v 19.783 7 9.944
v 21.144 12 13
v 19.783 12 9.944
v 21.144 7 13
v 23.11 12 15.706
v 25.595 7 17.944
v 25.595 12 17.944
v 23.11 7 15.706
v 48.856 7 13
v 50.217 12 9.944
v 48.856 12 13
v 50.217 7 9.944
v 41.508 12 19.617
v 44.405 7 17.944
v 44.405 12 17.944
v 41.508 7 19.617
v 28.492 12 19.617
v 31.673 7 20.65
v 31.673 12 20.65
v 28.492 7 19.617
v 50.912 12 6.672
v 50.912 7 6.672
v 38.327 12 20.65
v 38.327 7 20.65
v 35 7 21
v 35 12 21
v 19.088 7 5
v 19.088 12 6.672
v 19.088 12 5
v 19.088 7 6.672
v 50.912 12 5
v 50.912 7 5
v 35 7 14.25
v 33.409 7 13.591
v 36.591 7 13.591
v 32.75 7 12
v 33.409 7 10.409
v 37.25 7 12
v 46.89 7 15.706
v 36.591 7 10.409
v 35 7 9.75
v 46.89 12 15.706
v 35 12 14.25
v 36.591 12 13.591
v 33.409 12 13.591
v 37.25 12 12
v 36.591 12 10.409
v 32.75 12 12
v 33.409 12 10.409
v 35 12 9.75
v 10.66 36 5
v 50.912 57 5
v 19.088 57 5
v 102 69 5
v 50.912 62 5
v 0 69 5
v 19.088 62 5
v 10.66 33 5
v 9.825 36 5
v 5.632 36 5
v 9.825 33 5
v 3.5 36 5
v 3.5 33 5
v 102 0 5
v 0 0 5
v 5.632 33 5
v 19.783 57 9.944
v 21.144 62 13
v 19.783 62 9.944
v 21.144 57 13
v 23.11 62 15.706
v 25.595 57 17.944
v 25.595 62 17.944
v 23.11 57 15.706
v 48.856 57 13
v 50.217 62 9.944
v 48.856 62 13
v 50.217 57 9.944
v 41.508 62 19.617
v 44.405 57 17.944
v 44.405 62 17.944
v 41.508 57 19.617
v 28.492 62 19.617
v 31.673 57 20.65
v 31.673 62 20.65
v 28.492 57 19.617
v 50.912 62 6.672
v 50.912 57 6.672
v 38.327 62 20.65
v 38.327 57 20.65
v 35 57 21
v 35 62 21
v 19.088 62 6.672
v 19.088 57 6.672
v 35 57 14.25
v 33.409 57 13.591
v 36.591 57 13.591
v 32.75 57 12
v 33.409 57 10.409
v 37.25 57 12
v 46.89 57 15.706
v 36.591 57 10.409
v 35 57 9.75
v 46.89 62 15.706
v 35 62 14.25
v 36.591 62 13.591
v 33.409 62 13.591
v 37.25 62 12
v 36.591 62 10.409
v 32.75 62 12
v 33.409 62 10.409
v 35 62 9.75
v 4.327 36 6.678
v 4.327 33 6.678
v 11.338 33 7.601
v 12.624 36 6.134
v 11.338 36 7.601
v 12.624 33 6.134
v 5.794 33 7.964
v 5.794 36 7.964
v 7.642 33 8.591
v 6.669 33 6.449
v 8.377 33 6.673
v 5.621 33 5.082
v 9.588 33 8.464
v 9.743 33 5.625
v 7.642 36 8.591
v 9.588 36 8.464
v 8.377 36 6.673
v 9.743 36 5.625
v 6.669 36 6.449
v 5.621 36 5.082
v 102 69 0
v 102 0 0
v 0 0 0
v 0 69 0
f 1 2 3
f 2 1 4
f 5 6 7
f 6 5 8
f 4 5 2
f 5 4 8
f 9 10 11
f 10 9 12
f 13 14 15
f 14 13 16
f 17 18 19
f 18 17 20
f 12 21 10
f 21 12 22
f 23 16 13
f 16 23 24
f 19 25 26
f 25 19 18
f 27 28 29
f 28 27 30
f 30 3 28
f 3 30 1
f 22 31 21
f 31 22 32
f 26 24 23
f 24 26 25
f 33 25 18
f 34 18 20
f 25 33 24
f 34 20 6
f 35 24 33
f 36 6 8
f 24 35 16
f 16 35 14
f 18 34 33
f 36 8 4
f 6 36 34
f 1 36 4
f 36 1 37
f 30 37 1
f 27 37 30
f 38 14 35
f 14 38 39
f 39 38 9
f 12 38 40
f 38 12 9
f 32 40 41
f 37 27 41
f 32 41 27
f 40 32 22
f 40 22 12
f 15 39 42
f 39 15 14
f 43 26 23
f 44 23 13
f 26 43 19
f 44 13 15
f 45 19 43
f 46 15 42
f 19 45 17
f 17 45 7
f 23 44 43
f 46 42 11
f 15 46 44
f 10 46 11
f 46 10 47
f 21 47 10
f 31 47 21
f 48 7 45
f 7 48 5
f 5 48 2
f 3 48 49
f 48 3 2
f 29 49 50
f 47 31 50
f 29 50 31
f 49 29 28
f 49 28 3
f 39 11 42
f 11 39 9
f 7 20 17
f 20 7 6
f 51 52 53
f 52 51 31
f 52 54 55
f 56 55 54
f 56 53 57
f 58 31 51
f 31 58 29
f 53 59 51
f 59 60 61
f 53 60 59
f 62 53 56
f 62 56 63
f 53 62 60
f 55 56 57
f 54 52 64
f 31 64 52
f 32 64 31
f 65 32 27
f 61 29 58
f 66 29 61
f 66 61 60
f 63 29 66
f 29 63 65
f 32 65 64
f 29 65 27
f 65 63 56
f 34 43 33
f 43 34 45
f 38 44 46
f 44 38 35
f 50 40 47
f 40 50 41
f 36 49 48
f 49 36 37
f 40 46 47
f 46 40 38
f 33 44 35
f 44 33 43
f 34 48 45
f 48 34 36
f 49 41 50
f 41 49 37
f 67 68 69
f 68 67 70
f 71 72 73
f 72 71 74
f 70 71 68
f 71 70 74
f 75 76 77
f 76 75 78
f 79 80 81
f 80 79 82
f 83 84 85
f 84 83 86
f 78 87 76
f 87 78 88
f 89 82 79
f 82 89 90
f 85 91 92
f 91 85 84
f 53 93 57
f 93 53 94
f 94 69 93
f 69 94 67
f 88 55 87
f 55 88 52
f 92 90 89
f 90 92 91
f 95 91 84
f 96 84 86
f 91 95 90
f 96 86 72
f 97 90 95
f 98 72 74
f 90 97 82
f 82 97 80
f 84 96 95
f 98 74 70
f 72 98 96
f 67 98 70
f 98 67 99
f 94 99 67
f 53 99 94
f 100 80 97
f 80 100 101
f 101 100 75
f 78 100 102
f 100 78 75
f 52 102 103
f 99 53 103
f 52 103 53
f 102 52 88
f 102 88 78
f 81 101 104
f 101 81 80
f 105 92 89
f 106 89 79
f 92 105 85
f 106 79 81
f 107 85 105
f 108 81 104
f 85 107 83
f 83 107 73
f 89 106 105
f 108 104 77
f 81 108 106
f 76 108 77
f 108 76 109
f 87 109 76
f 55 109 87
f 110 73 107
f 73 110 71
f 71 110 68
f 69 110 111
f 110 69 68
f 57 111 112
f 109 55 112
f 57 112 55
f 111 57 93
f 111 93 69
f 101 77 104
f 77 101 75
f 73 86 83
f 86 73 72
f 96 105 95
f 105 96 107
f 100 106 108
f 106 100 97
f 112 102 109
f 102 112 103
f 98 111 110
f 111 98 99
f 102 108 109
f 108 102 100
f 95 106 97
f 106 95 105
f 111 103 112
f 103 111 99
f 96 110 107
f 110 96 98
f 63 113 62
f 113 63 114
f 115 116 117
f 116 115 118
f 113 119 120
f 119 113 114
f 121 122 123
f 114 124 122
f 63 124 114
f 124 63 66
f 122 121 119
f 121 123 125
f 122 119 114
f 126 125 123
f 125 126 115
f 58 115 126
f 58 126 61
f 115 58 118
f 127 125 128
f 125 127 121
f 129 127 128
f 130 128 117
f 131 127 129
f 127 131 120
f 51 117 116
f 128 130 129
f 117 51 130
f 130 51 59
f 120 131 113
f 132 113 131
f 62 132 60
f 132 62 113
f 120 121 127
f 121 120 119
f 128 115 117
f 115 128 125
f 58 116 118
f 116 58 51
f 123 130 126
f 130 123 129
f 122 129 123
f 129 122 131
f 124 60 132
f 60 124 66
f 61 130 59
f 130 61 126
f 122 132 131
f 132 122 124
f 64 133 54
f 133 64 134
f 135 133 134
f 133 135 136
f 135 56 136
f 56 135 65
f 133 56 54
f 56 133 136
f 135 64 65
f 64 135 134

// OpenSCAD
// prototype pedal 
plate_width = 102;
plate_length = 69;
plate_height = 5;

helperplate_width = 30;
helperplate_length = 5;
helperplate_height = 8;

spring_point = 55;


plate_dimensions = [
	plate_width,
	plate_length,
	plate_height];

	
drillhole_gap = 10;
drillhole_diameter = 4.5;
drillhole_spring_diameter = 6.5;
edge_gap = drillhole_gap + drillhole_diameter / 2; 


//https://www.reddit.com/r/openscad/comments/loask5/half_sphere_cropping_how_do_i_cut_things/
module halfcylinder(he,rd) {
difference(){
cylinder (h=he,r=rd);
translate ([0,-rd-0.1,-0.1]) cube([rd+0.1,rd*2+0.2,he+0.2]);
} // df
} // mod
cylinder_radius = 16;
cylinder_height = 5;

// use this command to get 2D redering -> deswegen auch alles rotiert
//projection(){
union(){

//linker Bügel
//rotate([90,0,0])
difference(){
    union(){ 
        translate([35, 7, 5])
        rotate([270,90,0])
        //color("blue")
        halfcylinder(cylinder_height,cylinder_radius);
    };
	
	translate([35, 0, 12])
    rotate([90,90,0])
	//color("black")
    cylinder(d = drillhole_diameter, h=cylinder_height + 60, center = true);
}


//rechte Bügel
//rotate([90,0,0])
difference(){
    union(){
        
        translate([35, plate_length-12, 5])
        rotate([270,90,0])
        //color("green")
        halfcylinder(cylinder_height,cylinder_radius);
		
    };
	
	translate([35, plate_length-5, 12])
		rotate([90,90,0])
		//color("black")
		cylinder(d = drillhole_diameter, h=cylinder_height + 60, center = true);
	
	translate([plate_width/2, plate_length-23-cylinder_height, 15])
    rotate([90,90,0])
	//color("white")
    cylinder(d = drillhole_diameter, h=cylinder_height + 5, center = true);
}

//haken nupsi
rotate([00,-30,0])
translate([13,0,-6])
difference(){
		translate([plate_width/2-spring_point, plate_length/2-3/2, plate_height])
		rotate([270,90,0])
			//color("yellow")
		halfcylinder(3,5);
		
		translate([plate_width/2-spring_point, plate_length/2, plate_height+1])
		rotate([90,90,0])
		cylinder(d = drillhole_diameter, h=cylinder_height + 5, center = true);		
}



//hier ziehen wir sachen von anderen sachen ab
//rotate([90,0,0])
union(){
   	
	cube(plate_dimensions);

	}
	
	
//}

}
